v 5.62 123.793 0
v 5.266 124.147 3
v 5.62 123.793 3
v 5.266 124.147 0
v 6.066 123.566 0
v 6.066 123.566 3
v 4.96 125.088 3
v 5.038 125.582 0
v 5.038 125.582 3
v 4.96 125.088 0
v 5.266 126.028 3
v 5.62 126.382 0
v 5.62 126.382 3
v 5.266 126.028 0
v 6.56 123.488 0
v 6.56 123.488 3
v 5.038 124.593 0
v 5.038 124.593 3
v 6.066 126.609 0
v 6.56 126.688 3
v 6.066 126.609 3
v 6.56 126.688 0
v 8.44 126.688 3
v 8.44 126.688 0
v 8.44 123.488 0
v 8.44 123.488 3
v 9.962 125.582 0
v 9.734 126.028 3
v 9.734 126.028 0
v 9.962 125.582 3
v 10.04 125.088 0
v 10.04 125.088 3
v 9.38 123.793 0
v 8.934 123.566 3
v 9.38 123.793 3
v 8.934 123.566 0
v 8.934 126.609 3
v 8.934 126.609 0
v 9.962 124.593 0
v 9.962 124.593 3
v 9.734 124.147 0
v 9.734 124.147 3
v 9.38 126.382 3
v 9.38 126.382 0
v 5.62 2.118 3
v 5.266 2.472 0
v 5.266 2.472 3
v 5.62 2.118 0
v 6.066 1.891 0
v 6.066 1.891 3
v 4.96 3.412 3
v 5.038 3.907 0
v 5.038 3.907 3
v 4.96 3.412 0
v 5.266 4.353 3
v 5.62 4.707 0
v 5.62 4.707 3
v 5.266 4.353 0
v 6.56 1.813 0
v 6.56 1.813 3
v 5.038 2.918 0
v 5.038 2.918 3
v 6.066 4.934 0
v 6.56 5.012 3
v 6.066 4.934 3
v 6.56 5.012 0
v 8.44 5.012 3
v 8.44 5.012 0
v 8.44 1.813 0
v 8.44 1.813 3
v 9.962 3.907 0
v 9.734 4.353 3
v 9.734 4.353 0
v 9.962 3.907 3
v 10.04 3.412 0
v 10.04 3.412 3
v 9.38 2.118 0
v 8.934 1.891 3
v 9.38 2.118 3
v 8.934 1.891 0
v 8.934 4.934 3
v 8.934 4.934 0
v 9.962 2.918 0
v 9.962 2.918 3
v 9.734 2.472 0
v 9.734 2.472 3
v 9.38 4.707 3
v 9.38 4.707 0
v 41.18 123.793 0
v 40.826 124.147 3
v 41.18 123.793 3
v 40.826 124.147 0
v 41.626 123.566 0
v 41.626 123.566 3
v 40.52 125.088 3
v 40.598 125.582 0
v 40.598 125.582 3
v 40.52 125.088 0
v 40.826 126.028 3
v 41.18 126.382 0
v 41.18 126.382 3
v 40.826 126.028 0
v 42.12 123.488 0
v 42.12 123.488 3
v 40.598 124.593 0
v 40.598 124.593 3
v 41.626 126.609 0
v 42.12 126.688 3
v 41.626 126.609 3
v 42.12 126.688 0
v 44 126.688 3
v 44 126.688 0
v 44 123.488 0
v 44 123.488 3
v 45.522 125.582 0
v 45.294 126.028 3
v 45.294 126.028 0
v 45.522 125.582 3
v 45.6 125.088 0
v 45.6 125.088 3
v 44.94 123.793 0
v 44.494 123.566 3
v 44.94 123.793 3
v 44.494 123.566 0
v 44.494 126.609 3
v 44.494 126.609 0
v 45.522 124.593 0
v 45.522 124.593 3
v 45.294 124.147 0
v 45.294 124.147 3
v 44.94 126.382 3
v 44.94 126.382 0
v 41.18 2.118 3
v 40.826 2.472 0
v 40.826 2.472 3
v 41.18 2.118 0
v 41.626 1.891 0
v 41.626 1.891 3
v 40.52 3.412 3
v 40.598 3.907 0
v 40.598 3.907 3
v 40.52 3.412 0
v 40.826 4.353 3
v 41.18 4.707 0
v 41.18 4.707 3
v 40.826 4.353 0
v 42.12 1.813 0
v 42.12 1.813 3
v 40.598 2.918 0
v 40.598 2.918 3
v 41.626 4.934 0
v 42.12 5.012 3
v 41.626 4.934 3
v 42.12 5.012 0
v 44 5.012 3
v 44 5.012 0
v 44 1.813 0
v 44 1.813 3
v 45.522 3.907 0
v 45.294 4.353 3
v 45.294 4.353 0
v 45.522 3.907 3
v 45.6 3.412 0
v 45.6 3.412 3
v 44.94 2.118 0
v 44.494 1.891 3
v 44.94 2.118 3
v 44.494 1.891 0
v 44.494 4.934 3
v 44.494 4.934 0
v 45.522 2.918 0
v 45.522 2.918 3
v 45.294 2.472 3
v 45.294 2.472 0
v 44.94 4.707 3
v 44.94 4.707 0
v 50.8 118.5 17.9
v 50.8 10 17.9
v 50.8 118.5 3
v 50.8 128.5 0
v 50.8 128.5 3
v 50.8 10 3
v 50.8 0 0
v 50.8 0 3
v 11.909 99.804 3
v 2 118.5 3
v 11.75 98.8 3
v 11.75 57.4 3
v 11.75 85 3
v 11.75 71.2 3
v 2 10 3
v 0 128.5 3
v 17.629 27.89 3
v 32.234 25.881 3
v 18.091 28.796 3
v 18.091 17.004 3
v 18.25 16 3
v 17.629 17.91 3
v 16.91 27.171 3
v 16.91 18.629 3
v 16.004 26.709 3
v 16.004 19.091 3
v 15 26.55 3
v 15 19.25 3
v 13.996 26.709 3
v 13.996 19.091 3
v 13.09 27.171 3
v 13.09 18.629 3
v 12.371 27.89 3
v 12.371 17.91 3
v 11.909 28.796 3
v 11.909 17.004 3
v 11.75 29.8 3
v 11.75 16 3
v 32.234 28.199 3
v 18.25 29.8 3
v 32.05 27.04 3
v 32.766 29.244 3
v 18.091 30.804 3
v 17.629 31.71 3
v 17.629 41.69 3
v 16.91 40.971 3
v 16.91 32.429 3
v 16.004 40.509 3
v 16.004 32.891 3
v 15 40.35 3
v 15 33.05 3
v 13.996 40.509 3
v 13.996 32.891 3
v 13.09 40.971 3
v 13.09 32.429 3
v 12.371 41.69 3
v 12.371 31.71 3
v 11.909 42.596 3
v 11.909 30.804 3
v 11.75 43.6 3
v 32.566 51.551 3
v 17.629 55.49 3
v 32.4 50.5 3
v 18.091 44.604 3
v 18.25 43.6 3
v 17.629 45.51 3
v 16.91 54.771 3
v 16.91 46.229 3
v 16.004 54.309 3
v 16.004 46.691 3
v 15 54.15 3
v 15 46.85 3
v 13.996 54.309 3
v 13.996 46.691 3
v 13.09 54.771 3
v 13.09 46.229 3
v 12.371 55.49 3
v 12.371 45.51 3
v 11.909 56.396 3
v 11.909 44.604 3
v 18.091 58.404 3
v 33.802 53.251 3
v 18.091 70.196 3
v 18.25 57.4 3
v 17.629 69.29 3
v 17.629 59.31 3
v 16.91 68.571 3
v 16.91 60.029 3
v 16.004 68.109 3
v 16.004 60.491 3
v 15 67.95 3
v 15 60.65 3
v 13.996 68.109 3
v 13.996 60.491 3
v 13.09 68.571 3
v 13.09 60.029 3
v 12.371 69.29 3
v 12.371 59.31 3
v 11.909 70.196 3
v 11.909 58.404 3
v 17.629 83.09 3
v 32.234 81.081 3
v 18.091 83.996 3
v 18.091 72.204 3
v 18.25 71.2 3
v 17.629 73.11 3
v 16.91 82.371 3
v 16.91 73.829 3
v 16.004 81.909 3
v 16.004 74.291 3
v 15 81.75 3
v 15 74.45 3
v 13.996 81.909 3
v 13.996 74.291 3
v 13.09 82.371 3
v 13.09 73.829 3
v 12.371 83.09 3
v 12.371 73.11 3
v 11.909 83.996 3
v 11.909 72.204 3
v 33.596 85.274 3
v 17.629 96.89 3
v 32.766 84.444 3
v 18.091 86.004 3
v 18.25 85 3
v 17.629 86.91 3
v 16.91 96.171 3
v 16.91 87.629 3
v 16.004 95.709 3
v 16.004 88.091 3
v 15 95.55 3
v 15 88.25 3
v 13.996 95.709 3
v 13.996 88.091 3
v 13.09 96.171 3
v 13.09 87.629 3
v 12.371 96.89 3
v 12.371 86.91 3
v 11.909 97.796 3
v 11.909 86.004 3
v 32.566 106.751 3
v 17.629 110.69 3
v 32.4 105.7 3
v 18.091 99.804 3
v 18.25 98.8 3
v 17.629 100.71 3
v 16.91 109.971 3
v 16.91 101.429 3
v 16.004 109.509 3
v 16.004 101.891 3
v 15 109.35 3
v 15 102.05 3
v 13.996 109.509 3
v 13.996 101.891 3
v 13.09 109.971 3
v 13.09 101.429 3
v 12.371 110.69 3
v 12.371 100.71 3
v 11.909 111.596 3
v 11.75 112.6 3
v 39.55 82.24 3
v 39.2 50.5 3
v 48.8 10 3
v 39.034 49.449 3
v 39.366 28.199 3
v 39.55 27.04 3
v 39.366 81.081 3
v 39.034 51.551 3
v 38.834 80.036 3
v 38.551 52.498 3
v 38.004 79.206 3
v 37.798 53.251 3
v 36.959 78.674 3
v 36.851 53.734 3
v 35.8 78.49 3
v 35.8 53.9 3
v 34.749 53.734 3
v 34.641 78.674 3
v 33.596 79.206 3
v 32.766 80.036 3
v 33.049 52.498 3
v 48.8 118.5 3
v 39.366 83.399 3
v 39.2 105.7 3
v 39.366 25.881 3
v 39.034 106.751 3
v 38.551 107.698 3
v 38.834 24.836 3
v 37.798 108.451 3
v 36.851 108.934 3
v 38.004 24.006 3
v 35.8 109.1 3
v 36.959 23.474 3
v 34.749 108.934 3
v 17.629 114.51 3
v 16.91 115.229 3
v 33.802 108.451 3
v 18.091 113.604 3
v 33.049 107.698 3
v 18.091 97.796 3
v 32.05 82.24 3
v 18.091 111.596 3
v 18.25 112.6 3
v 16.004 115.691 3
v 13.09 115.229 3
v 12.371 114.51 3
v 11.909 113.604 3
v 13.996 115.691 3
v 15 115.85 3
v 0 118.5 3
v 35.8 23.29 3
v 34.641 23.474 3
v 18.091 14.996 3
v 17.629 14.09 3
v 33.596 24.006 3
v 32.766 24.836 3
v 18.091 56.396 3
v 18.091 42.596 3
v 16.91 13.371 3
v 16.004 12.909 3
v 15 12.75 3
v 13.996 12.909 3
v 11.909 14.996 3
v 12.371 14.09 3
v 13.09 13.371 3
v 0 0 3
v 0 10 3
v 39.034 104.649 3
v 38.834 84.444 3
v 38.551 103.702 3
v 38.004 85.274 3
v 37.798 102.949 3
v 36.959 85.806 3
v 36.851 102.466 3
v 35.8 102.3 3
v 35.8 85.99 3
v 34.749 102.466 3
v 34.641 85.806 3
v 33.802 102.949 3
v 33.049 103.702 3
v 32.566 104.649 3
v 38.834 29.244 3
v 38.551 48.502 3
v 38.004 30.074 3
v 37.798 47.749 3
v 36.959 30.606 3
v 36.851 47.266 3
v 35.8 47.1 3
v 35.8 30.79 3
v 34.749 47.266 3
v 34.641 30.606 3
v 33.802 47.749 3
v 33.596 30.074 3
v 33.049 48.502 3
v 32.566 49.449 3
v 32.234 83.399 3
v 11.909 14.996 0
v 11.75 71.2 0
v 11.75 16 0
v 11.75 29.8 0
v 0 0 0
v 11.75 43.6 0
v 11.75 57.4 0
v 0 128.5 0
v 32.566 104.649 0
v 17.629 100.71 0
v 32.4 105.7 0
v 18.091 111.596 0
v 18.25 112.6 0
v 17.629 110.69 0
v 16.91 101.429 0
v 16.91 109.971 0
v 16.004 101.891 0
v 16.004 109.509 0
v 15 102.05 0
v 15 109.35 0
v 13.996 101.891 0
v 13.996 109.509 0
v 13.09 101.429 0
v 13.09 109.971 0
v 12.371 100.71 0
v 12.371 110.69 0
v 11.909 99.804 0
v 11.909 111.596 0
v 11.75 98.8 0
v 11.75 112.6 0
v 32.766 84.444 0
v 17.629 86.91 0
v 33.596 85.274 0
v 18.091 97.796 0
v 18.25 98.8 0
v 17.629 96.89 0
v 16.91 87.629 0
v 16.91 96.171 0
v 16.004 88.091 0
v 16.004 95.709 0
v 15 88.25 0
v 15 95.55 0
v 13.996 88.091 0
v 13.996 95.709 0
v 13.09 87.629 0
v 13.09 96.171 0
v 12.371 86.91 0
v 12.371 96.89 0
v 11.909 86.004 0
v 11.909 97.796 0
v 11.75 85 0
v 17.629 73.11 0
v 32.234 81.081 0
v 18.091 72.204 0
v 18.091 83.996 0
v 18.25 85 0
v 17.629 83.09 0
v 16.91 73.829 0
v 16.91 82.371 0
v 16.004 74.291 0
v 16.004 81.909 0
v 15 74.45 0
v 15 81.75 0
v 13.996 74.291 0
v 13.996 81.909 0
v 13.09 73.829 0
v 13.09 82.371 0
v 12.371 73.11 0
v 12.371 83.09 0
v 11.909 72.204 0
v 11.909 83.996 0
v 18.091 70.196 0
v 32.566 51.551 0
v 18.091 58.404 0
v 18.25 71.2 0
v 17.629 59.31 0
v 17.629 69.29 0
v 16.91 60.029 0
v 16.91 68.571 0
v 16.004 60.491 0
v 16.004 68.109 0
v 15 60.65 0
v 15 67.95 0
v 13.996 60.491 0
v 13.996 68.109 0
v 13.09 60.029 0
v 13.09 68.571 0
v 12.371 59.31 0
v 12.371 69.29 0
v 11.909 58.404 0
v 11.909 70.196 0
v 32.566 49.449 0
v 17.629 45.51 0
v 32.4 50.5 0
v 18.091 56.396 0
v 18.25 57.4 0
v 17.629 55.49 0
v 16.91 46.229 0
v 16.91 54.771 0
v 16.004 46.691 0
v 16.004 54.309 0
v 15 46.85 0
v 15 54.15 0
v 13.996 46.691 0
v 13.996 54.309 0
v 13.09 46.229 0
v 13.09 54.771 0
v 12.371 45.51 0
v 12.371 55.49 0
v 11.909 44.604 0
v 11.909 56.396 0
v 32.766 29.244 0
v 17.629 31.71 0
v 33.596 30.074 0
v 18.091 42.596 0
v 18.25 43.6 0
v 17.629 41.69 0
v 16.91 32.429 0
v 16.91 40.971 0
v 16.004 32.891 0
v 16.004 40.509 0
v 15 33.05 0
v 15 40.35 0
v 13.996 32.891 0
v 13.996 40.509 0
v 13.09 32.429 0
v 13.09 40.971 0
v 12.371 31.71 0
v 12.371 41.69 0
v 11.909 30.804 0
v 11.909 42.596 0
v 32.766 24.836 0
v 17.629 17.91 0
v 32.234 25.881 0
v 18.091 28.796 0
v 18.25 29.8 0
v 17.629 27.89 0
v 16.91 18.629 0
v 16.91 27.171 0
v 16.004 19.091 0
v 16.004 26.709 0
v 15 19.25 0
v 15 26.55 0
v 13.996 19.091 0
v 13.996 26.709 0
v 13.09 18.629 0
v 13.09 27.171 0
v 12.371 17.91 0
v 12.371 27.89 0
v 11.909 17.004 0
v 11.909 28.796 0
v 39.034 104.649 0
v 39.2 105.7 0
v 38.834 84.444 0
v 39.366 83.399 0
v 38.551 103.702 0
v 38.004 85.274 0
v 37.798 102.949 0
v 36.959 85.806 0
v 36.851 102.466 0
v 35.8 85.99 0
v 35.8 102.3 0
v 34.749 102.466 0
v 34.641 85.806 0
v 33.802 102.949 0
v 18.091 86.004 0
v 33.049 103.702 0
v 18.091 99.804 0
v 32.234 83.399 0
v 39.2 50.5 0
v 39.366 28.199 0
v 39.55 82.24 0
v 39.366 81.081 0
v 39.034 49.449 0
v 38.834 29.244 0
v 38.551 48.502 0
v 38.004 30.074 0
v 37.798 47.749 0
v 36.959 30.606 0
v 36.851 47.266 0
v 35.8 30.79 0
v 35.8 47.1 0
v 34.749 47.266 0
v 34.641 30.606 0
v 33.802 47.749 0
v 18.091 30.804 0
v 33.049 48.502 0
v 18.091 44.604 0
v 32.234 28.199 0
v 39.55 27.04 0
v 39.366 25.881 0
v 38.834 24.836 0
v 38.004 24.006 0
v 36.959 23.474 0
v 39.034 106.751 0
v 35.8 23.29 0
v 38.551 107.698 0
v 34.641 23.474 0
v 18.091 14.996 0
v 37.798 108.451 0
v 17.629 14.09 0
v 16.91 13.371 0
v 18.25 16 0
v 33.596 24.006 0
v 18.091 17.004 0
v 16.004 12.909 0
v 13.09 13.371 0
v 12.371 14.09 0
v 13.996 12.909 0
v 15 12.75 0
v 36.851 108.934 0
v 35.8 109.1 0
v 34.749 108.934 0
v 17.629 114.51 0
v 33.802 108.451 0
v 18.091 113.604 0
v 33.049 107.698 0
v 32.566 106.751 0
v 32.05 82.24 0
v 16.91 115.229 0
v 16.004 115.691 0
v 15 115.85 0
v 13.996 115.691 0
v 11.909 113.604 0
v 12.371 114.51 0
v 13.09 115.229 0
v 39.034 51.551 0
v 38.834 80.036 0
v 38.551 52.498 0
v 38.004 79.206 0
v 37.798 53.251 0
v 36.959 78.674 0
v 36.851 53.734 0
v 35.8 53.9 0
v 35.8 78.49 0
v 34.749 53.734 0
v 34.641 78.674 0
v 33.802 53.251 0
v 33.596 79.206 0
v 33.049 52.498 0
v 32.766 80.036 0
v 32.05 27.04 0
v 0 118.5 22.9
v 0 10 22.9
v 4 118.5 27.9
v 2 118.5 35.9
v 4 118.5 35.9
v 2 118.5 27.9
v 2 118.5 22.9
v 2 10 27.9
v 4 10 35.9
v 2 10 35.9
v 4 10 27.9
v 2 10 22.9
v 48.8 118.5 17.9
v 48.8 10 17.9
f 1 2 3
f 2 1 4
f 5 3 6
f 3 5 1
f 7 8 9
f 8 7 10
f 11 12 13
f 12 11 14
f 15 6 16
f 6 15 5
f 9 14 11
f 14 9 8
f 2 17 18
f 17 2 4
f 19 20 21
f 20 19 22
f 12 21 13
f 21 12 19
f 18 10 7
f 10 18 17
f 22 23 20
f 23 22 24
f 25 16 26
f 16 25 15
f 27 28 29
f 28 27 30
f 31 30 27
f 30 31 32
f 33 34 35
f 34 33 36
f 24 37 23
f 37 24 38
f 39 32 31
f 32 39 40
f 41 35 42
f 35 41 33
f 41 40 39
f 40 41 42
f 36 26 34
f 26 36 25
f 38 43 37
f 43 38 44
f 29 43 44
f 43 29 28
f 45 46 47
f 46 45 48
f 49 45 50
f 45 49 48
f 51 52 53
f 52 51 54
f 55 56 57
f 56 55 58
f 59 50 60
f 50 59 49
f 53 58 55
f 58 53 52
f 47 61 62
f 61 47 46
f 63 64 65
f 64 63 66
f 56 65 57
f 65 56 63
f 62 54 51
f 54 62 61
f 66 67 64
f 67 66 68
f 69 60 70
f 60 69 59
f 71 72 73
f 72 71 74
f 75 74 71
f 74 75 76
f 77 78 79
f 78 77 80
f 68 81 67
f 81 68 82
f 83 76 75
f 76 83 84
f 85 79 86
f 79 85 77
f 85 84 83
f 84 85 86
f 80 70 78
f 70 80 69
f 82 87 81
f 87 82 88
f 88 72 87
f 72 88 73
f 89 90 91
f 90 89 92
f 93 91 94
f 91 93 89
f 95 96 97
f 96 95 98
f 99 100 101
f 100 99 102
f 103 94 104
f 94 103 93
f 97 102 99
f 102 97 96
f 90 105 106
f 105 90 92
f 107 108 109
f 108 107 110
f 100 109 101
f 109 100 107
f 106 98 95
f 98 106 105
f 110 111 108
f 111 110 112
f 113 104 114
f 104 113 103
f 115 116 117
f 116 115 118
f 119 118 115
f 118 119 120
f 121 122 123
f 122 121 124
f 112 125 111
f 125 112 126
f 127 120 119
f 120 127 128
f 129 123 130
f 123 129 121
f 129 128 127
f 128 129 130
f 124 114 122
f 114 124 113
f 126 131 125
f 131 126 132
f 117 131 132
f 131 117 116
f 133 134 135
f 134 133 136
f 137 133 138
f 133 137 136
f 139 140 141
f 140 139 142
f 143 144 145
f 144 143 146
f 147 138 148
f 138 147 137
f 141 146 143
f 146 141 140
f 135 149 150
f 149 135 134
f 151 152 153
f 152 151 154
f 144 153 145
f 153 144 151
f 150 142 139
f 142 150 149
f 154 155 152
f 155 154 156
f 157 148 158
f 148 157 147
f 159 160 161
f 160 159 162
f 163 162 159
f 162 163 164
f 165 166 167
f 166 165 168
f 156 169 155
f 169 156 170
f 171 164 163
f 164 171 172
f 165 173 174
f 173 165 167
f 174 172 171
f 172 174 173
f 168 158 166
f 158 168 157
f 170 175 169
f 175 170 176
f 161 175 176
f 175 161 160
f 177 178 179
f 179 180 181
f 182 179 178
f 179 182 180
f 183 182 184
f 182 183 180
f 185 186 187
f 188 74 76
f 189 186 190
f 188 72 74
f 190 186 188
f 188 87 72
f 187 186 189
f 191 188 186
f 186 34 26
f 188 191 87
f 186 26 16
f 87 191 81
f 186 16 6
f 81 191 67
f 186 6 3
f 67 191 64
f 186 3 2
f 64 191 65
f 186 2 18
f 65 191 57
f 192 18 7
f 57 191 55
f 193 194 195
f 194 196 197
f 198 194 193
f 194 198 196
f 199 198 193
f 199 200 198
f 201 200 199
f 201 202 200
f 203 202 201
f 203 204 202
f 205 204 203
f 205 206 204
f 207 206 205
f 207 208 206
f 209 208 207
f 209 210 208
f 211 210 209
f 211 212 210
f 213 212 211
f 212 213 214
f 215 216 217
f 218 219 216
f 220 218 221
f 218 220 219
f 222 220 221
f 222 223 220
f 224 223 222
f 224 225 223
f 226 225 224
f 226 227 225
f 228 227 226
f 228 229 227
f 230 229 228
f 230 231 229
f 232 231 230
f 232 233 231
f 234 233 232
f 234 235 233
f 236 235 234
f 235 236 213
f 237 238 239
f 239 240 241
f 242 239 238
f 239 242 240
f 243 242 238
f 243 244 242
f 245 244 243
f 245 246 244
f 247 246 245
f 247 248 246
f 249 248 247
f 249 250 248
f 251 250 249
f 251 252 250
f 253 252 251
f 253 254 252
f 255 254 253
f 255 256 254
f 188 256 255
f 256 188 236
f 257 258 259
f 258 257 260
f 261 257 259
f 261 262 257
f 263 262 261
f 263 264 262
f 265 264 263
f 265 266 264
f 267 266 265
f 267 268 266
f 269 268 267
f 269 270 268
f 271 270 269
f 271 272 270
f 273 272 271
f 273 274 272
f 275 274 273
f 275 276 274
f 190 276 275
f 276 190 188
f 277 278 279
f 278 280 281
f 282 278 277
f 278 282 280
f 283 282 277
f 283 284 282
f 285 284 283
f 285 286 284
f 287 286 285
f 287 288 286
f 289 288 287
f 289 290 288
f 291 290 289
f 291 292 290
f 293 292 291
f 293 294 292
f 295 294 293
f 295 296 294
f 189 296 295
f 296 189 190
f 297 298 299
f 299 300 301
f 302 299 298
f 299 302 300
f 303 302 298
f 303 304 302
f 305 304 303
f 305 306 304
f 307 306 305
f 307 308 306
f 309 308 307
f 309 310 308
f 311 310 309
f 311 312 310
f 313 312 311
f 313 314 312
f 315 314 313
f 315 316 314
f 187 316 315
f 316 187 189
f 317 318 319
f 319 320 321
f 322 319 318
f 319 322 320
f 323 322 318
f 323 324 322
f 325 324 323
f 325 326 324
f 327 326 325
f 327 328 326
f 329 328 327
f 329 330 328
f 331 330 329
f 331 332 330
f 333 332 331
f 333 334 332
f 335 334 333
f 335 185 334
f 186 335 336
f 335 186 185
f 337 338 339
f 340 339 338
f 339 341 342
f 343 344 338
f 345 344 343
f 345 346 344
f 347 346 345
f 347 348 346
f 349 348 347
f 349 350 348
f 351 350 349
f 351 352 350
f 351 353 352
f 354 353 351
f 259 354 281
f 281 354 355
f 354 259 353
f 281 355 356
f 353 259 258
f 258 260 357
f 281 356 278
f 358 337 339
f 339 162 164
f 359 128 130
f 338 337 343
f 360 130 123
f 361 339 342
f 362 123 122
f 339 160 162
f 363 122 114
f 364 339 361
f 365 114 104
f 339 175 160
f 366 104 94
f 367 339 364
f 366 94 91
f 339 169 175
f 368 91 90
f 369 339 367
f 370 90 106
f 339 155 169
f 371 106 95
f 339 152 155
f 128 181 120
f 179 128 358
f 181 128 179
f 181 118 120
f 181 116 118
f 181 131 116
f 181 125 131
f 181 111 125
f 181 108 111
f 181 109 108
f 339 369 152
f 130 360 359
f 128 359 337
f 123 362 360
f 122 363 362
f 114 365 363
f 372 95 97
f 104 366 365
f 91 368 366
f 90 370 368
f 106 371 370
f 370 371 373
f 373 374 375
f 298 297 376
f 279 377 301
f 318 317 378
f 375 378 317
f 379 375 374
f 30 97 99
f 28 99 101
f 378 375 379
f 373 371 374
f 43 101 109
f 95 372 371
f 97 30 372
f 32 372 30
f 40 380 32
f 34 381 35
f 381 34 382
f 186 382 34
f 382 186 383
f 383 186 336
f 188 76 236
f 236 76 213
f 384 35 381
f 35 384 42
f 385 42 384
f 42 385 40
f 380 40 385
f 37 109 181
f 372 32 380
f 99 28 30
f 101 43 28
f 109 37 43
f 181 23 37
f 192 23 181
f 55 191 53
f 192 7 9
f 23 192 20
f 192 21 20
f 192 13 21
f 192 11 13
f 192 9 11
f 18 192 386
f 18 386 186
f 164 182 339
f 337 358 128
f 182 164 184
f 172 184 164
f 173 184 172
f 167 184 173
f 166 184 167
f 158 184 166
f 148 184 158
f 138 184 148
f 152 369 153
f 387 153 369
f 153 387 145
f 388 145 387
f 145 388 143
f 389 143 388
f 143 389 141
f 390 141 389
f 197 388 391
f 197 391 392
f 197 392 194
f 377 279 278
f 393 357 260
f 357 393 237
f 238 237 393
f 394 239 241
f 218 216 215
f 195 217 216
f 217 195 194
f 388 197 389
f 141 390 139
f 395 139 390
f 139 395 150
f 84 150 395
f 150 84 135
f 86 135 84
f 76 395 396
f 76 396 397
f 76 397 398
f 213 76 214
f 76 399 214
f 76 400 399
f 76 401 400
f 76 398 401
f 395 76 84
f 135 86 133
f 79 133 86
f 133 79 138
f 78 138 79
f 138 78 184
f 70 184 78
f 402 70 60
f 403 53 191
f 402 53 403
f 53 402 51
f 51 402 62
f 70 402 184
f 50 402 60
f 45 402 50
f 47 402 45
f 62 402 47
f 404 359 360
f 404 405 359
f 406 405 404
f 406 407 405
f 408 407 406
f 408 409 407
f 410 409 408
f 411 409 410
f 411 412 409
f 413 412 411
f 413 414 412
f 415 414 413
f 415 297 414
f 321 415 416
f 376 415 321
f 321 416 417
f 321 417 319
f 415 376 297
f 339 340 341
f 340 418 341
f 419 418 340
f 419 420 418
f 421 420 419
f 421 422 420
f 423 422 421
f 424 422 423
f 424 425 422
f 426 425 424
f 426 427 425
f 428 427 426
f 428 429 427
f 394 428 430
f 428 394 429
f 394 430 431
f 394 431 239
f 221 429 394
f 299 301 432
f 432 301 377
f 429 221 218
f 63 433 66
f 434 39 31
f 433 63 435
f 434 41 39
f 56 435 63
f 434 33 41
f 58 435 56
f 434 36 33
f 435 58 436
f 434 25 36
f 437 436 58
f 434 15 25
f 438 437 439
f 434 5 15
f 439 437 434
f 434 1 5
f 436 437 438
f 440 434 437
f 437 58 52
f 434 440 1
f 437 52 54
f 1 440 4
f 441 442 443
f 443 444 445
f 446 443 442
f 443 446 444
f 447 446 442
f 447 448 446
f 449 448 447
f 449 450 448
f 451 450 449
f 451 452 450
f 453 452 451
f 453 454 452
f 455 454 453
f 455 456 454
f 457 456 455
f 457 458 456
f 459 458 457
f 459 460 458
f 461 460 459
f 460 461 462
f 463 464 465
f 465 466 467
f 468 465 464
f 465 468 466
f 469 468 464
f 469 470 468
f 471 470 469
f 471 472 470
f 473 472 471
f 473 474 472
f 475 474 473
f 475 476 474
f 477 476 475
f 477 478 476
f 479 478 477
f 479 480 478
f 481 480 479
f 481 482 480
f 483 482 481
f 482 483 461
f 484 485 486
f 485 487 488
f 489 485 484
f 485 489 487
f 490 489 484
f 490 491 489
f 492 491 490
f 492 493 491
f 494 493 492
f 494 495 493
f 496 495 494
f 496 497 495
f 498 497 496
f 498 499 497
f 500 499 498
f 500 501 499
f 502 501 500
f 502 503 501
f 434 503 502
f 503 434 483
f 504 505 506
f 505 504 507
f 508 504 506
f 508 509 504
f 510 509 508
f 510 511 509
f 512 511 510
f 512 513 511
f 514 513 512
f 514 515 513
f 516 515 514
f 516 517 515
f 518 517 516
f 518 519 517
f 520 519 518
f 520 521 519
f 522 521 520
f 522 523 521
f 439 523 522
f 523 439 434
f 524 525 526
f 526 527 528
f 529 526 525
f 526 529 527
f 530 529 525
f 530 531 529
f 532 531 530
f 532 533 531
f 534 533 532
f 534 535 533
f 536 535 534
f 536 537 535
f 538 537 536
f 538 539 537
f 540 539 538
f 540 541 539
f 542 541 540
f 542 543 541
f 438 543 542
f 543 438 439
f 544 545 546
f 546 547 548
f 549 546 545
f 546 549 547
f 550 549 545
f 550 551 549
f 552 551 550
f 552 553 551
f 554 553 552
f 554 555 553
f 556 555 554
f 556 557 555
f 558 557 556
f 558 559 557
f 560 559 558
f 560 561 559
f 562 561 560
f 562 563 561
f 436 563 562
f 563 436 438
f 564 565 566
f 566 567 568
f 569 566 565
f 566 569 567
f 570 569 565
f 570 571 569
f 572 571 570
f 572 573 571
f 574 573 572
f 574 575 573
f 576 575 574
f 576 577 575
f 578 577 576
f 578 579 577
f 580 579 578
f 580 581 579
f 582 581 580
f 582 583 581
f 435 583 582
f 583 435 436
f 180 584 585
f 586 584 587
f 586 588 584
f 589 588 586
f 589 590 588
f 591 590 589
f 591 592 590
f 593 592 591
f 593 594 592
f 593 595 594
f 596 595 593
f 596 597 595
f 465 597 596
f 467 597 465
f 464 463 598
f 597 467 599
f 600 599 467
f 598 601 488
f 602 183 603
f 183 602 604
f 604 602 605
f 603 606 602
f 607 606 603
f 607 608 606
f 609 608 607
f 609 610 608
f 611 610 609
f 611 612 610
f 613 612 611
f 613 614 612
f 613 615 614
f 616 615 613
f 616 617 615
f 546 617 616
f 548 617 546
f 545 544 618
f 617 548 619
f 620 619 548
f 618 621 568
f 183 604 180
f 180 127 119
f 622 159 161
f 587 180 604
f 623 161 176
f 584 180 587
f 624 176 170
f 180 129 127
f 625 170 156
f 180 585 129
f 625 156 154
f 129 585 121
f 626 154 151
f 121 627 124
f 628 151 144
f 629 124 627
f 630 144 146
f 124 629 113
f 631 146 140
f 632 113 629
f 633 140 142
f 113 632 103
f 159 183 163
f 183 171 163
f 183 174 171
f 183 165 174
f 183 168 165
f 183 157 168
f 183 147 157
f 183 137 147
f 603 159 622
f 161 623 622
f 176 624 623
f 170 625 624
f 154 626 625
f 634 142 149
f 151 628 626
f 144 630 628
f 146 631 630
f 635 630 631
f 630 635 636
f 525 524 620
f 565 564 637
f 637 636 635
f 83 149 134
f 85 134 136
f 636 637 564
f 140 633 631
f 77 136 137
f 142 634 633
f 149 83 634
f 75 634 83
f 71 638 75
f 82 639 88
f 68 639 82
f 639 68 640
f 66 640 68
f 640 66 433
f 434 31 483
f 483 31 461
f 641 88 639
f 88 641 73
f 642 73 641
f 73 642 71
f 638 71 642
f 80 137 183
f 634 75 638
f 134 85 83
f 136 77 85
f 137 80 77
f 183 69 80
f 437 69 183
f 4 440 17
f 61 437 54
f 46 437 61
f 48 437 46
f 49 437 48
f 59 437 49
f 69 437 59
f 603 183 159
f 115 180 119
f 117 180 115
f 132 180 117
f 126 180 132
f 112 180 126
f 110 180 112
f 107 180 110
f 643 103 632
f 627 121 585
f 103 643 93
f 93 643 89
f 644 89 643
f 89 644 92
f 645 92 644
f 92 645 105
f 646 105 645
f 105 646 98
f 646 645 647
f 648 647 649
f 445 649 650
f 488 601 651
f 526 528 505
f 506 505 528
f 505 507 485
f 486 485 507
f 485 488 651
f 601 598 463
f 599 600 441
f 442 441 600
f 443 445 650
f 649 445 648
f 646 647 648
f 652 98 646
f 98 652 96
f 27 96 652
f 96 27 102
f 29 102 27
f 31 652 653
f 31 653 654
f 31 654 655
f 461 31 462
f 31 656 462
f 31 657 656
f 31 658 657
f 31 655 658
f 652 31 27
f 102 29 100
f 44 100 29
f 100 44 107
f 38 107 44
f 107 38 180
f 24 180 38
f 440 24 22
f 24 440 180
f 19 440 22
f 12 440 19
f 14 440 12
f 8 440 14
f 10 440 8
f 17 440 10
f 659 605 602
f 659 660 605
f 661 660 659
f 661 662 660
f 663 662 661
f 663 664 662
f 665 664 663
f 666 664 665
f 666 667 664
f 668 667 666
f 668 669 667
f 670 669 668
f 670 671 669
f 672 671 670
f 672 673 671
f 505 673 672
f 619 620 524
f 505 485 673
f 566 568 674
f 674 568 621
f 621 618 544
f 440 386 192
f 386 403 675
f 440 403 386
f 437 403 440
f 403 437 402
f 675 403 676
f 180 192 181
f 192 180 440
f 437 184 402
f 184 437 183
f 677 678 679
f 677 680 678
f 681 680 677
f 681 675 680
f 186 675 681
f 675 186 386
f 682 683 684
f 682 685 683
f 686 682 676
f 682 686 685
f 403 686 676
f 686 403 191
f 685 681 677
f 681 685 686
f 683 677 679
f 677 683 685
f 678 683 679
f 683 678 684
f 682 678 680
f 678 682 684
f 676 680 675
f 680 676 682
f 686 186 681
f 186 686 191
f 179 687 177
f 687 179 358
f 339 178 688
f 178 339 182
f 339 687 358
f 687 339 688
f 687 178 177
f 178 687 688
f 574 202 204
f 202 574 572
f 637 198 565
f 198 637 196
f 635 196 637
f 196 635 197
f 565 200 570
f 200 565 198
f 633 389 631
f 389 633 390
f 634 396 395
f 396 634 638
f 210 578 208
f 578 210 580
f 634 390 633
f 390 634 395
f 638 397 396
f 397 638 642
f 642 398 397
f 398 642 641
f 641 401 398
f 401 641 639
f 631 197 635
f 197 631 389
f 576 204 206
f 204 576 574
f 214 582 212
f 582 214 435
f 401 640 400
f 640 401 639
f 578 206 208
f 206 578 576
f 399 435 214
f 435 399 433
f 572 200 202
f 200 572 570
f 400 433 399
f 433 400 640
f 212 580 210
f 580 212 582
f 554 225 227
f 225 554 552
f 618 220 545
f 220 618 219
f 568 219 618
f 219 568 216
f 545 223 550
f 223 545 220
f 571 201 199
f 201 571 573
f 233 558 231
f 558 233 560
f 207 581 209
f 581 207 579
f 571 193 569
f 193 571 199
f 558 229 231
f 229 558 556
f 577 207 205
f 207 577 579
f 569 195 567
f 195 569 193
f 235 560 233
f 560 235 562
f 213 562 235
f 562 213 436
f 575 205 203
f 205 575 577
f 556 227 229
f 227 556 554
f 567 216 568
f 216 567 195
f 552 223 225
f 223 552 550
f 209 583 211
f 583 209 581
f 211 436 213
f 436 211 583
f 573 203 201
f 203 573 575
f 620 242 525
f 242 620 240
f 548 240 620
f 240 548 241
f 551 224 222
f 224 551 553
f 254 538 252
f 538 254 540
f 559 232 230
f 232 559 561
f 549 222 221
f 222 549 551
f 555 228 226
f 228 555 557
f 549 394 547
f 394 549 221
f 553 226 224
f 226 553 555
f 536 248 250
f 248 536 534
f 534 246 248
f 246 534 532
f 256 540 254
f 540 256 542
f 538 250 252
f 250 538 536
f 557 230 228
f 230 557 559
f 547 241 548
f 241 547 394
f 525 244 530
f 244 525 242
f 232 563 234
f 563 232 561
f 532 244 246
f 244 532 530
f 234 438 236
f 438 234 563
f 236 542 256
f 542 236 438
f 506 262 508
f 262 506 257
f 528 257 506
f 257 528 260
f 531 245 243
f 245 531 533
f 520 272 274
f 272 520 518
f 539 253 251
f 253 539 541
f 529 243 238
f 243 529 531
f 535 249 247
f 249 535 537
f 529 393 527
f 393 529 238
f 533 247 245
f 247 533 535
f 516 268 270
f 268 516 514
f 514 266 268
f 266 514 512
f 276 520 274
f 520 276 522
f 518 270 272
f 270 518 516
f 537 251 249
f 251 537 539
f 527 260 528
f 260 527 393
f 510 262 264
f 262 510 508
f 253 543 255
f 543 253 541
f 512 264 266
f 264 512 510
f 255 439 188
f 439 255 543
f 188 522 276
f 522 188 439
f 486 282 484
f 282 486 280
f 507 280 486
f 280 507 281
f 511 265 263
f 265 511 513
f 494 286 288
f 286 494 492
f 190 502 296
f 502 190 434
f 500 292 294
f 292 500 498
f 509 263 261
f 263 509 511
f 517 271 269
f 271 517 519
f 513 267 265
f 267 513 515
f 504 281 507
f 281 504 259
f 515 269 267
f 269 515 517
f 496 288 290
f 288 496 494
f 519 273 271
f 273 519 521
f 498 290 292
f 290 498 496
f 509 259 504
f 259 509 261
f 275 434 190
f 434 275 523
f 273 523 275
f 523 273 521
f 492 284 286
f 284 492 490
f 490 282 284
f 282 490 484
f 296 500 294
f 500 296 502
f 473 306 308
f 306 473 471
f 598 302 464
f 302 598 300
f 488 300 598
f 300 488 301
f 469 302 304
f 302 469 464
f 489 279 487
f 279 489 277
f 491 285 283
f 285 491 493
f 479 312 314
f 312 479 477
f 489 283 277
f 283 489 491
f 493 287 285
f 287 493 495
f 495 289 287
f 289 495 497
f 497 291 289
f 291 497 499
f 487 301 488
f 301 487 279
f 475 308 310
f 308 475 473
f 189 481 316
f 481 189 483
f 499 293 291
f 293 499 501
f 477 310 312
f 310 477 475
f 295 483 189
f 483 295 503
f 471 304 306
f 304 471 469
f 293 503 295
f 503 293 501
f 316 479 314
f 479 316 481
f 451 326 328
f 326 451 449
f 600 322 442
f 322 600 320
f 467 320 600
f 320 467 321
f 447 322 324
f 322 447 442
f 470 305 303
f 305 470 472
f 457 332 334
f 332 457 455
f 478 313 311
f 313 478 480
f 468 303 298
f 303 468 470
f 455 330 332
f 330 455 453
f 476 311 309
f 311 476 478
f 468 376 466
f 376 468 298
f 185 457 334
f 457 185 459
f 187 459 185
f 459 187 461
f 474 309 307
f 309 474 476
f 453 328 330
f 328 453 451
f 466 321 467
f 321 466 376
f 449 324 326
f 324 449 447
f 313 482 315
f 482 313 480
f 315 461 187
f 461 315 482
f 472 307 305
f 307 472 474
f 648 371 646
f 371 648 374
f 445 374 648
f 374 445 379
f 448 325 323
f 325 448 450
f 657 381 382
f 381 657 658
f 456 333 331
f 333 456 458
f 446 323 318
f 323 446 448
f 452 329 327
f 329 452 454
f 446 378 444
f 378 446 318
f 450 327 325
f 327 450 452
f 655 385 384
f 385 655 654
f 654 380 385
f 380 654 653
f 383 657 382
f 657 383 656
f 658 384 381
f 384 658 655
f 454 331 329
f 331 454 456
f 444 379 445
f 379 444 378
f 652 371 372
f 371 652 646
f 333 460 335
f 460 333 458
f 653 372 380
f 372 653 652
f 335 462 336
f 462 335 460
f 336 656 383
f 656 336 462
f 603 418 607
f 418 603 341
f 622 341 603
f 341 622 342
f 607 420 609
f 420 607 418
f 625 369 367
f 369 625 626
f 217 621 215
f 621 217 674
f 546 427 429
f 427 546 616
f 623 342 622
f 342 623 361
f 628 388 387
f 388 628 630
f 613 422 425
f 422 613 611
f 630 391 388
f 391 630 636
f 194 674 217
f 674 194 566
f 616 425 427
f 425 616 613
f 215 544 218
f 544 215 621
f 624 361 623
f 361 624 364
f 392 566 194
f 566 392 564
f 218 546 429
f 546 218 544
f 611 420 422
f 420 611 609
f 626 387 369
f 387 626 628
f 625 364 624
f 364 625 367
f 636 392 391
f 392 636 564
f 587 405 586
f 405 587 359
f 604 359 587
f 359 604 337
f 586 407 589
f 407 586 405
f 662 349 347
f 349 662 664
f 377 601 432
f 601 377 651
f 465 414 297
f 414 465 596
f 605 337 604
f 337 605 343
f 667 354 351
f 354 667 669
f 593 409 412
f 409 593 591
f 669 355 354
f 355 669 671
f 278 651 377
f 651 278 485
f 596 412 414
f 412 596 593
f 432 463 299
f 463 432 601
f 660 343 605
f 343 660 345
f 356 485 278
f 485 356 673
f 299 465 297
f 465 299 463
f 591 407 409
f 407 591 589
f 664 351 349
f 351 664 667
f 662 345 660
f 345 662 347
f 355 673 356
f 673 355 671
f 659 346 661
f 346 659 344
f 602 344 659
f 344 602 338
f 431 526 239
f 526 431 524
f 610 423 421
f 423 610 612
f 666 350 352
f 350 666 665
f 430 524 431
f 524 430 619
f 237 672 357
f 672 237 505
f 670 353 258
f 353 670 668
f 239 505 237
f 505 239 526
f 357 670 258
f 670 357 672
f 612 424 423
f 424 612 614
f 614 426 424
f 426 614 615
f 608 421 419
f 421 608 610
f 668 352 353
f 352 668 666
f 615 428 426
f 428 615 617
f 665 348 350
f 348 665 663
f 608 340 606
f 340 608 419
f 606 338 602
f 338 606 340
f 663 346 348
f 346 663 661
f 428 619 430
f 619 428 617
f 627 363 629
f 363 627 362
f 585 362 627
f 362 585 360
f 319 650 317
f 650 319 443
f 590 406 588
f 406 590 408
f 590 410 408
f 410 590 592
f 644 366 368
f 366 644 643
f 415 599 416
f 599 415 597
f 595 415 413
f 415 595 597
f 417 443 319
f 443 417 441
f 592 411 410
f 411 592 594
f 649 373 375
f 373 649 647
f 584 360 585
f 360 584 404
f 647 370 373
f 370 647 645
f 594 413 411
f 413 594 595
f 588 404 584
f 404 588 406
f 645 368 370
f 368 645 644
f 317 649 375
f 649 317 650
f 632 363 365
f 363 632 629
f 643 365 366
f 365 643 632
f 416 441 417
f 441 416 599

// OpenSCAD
// file: eurorack-lib/eurorack-lib.scad
include <constants.scad>

// how wide the holes should be
holeWidth = 5.08;
mountHoleDiameter = 3.2; // M3

hwCubeWidth = holeWidth - mountHoleDiameter;
mountHoleRad = mountHoleDiameter/2;
mountHoleXMargin = 7.5; // http://www.doepfer.de/a100_man/a100m_e.htm
panelInnerHeight = 110; //rail clearance = ~11.675mm, top and bottom
railHeight = (threeUHeight-panelOuterHeight)/2;
mountSurfaceHeight = (panelOuterHeight-panelInnerHeight-railHeight*2)/2;
offsetToMountHoleCenterY = mountSurfaceHeight/2;
mountHoleDepth = panelThickness+2;


module eurorackPanel(panelHp, mountHoles=4) {
  //mountHoles ought to be even. Odd values are -=1
  difference() {
    cube([hp*panelHp,panelOuterHeight,panelThickness]);

    holes = mountHoles-mountHoles%2; //mountHoles ought to be even for the sake of code complexity. Odd values are -=1
    offsetToMountHoleCenterX = mountHoleXMargin - hwCubeWidth/2;
    // Iteratively calc this since I'm tired and can't do math right now. Point is that since
    // Doepfer says 7.5 from left side, we can't use same offset from the right side since not a multiple of hp
    // See http://www.doepfer.de/a100_man/a100m_e.htm
    rightMountHoleOffsetX = offsetToMountHoleCenterX+hp*(panelHp-3);


    //topleft
    translate([offsetToMountHoleCenterX,panelOuterHeight-offsetToMountHoleCenterY,0])
      eurorackMountHole();
    translate([offsetToMountHoleCenterX,offsetToMountHoleCenterY,0])
      eurorackMountHole();


    if(holes>2) {
      //topRight
      translate([rightMountHoleOffsetX,panelOuterHeight-offsetToMountHoleCenterY,0])
        eurorackMountHole();

      //bottomRight
      translate([rightMountHoleOffsetX,offsetToMountHoleCenterY,0])
          eurorackMountHole();
    }
  }
}

module eurorackMountHole() {
    mountHoleDepth = panelThickness+2; //because diffs need to be larger than the object they are being diffed from for ideal BSP operations
    if(hwCubeWidth<0) {
      hwCubeWidth=0;
    }
    translate([0,0,-1]) {
      cylinder(r=mountHoleRad, h=mountHoleDepth, $fn=20);
      translate([0,-mountHoleRad,0])
        cube([hwCubeWidth, mountHoleDiameter, mountHoleDepth]);
      translate([hwCubeWidth,0,0])
        cylinder(r=mountHoleRad, h=mountHoleDepth, $fn=20);
    }
}

module walls(panelHp) {
  width = panelHp * hp;
  straightY=20;
  straightY2=10;
  angleY=5;
  angleX=2;
  thickness = 2;
  leftPath = [
    [0, 0],
    [thickness, 0],
    [thickness, straightY],
    [thickness + angleX, straightY + angleY],
    [thickness + angleX, straightY + straightY2  + angleY-thickness],
    /*[thickness, straightY + angleY * 3 - thickness],
    [thickness, straightY*2 + angleY * 3],
    [0, straightY*2 + angleY * 3],
    [0, straightY + angleY * 3 - thickness],*/
    [angleX, straightY+straightY2 + angleY - thickness],
    [angleX, straightY + angleY],
    [0, straightY]
  ];

  straightYOtherSide=15;
  rightPath = [
    [0, 0],
    [thickness, 0],
    [angleX, straightYOtherSide],
    [0, straightYOtherSide]
  ];

  wallYMarginPerSide = 10;
  wallY = panelOuterHeight - wallYMarginPerSide*2;

  translate([0, panelOuterHeight - wallYMarginPerSide, panelThickness-0.1]) {
    rotate([90, 0, 0]) {
      linear_extrude(height=wallY) polygon(points=leftPath);
      translate([width-thickness, 0, 0]) {
        linear_extrude(height=wallY) polygon(points=rightPath);
      }
    }
  }
}

 
// Square and cirular cutout to make the protrude a bit more
// I have a big batch of defective ones with short threads so need that extra
module PJ301() {
  jackHoleDiam = 6.5;

  translate([0, 0, -0.01])
    cylinder(d=jackHoleDiam, h=mountHoleDepth+2, $fn=40);
  translate([0, 0, panelThickness-1.5])
    cylinder(d=8.5, h=1.4, $fn=40);

  extra_cutting_upwards = 10;
  translate([0, 0.7, panelThickness + extra_cutting_upwards/2])
    cube([9.5, 11, 2.1 + extra_cutting_upwards], true);
}

// The cheap larger pots
module AlphaPot() {
  potHoleDiam = 7.5;
  translate([0, 0, -0.01])
    cylinder(d=potHoleDiam, h=mountHoleDepth+2, $fn=40);
}

module RV09Pot() {
  potHoleDiam = 7;
  translate([0, 0, -0.01])
    cylinder(d=potHoleDiam, h=mountHoleDepth+2, $fn=40);
}

module ThreeMmLed() {
  translate([0, 0, -0.01])
    cylinder(d=3.4, h=mountHoleDepth+2, $fn=40);
}
// file: eurorack-lib/constants.scad
hp = 5.08;
threeUHeight = 133.35; //overall 3u height
panelOuterHeight =128.5;

// Should be 2mm, but 2.5 makes for lots of room for squish and sanding
// panelThickness = 2.5;
panelThickness = 3;
// main file
include <eurorack-lib/constants.scad>
use <eurorack-lib/eurorack-lib.scad>

panelHp = 10;
width = hp * panelHp;

potHoleDiam = 7.5;
jackHoleDiam = 6.5;
switchHoleDiam = 6.8;
phoneJackHoleDiam = 8.8;

// Should be 2mm, but 2.5 makes for lots of room for squish and sanding
panelThickness = 2.5;

sideMagin = 15;

firstCol = sideMagin;
secondCol = width - sideMagin;

middle = width / 2;

topMargin = 16;
verticalSpacing = 13.8;

holes = [
  // jacks
  [firstCol, topMargin, jackHoleDiam], // input level
  [firstCol, topMargin + verticalSpacing, jackHoleDiam], // input level
  [firstCol, topMargin + verticalSpacing*2, jackHoleDiam],
  [firstCol, topMargin + verticalSpacing*3, jackHoleDiam],
  [firstCol, topMargin + verticalSpacing*4, jackHoleDiam],
  [firstCol, topMargin + verticalSpacing*5, jackHoleDiam],
  [firstCol, topMargin + verticalSpacing*6, jackHoleDiam],
  [firstCol, topMargin + verticalSpacing*7, jackHoleDiam],

  // pots
  [secondCol, topMargin + verticalSpacing*0.8, potHoleDiam],
  [secondCol, topMargin + verticalSpacing*4.8, potHoleDiam],

  [secondCol, topMargin + verticalSpacing*2.5, switchHoleDiam],
  [secondCol, topMargin + verticalSpacing*6.5, switchHoleDiam],
  /*[secondCol, topMargin + verticalSpacing*4+5-7, phoneJackHoleDiam] // headphones*/
];

mountHoleDepth = panelThickness+2;

module holes() {
  translate([0, 0, -0.1]) { // to make holes through proper
    for(hole = holes) {
      translate([hole[0], hole[1]])
      cylinder(d=hole[2], h=mountHoleDepth, $fn=20);
    }
  }
}

difference() {
  union() {
    eurorackPanel(panelHp, 4);
    walls(10);
  }
  holes();
}
